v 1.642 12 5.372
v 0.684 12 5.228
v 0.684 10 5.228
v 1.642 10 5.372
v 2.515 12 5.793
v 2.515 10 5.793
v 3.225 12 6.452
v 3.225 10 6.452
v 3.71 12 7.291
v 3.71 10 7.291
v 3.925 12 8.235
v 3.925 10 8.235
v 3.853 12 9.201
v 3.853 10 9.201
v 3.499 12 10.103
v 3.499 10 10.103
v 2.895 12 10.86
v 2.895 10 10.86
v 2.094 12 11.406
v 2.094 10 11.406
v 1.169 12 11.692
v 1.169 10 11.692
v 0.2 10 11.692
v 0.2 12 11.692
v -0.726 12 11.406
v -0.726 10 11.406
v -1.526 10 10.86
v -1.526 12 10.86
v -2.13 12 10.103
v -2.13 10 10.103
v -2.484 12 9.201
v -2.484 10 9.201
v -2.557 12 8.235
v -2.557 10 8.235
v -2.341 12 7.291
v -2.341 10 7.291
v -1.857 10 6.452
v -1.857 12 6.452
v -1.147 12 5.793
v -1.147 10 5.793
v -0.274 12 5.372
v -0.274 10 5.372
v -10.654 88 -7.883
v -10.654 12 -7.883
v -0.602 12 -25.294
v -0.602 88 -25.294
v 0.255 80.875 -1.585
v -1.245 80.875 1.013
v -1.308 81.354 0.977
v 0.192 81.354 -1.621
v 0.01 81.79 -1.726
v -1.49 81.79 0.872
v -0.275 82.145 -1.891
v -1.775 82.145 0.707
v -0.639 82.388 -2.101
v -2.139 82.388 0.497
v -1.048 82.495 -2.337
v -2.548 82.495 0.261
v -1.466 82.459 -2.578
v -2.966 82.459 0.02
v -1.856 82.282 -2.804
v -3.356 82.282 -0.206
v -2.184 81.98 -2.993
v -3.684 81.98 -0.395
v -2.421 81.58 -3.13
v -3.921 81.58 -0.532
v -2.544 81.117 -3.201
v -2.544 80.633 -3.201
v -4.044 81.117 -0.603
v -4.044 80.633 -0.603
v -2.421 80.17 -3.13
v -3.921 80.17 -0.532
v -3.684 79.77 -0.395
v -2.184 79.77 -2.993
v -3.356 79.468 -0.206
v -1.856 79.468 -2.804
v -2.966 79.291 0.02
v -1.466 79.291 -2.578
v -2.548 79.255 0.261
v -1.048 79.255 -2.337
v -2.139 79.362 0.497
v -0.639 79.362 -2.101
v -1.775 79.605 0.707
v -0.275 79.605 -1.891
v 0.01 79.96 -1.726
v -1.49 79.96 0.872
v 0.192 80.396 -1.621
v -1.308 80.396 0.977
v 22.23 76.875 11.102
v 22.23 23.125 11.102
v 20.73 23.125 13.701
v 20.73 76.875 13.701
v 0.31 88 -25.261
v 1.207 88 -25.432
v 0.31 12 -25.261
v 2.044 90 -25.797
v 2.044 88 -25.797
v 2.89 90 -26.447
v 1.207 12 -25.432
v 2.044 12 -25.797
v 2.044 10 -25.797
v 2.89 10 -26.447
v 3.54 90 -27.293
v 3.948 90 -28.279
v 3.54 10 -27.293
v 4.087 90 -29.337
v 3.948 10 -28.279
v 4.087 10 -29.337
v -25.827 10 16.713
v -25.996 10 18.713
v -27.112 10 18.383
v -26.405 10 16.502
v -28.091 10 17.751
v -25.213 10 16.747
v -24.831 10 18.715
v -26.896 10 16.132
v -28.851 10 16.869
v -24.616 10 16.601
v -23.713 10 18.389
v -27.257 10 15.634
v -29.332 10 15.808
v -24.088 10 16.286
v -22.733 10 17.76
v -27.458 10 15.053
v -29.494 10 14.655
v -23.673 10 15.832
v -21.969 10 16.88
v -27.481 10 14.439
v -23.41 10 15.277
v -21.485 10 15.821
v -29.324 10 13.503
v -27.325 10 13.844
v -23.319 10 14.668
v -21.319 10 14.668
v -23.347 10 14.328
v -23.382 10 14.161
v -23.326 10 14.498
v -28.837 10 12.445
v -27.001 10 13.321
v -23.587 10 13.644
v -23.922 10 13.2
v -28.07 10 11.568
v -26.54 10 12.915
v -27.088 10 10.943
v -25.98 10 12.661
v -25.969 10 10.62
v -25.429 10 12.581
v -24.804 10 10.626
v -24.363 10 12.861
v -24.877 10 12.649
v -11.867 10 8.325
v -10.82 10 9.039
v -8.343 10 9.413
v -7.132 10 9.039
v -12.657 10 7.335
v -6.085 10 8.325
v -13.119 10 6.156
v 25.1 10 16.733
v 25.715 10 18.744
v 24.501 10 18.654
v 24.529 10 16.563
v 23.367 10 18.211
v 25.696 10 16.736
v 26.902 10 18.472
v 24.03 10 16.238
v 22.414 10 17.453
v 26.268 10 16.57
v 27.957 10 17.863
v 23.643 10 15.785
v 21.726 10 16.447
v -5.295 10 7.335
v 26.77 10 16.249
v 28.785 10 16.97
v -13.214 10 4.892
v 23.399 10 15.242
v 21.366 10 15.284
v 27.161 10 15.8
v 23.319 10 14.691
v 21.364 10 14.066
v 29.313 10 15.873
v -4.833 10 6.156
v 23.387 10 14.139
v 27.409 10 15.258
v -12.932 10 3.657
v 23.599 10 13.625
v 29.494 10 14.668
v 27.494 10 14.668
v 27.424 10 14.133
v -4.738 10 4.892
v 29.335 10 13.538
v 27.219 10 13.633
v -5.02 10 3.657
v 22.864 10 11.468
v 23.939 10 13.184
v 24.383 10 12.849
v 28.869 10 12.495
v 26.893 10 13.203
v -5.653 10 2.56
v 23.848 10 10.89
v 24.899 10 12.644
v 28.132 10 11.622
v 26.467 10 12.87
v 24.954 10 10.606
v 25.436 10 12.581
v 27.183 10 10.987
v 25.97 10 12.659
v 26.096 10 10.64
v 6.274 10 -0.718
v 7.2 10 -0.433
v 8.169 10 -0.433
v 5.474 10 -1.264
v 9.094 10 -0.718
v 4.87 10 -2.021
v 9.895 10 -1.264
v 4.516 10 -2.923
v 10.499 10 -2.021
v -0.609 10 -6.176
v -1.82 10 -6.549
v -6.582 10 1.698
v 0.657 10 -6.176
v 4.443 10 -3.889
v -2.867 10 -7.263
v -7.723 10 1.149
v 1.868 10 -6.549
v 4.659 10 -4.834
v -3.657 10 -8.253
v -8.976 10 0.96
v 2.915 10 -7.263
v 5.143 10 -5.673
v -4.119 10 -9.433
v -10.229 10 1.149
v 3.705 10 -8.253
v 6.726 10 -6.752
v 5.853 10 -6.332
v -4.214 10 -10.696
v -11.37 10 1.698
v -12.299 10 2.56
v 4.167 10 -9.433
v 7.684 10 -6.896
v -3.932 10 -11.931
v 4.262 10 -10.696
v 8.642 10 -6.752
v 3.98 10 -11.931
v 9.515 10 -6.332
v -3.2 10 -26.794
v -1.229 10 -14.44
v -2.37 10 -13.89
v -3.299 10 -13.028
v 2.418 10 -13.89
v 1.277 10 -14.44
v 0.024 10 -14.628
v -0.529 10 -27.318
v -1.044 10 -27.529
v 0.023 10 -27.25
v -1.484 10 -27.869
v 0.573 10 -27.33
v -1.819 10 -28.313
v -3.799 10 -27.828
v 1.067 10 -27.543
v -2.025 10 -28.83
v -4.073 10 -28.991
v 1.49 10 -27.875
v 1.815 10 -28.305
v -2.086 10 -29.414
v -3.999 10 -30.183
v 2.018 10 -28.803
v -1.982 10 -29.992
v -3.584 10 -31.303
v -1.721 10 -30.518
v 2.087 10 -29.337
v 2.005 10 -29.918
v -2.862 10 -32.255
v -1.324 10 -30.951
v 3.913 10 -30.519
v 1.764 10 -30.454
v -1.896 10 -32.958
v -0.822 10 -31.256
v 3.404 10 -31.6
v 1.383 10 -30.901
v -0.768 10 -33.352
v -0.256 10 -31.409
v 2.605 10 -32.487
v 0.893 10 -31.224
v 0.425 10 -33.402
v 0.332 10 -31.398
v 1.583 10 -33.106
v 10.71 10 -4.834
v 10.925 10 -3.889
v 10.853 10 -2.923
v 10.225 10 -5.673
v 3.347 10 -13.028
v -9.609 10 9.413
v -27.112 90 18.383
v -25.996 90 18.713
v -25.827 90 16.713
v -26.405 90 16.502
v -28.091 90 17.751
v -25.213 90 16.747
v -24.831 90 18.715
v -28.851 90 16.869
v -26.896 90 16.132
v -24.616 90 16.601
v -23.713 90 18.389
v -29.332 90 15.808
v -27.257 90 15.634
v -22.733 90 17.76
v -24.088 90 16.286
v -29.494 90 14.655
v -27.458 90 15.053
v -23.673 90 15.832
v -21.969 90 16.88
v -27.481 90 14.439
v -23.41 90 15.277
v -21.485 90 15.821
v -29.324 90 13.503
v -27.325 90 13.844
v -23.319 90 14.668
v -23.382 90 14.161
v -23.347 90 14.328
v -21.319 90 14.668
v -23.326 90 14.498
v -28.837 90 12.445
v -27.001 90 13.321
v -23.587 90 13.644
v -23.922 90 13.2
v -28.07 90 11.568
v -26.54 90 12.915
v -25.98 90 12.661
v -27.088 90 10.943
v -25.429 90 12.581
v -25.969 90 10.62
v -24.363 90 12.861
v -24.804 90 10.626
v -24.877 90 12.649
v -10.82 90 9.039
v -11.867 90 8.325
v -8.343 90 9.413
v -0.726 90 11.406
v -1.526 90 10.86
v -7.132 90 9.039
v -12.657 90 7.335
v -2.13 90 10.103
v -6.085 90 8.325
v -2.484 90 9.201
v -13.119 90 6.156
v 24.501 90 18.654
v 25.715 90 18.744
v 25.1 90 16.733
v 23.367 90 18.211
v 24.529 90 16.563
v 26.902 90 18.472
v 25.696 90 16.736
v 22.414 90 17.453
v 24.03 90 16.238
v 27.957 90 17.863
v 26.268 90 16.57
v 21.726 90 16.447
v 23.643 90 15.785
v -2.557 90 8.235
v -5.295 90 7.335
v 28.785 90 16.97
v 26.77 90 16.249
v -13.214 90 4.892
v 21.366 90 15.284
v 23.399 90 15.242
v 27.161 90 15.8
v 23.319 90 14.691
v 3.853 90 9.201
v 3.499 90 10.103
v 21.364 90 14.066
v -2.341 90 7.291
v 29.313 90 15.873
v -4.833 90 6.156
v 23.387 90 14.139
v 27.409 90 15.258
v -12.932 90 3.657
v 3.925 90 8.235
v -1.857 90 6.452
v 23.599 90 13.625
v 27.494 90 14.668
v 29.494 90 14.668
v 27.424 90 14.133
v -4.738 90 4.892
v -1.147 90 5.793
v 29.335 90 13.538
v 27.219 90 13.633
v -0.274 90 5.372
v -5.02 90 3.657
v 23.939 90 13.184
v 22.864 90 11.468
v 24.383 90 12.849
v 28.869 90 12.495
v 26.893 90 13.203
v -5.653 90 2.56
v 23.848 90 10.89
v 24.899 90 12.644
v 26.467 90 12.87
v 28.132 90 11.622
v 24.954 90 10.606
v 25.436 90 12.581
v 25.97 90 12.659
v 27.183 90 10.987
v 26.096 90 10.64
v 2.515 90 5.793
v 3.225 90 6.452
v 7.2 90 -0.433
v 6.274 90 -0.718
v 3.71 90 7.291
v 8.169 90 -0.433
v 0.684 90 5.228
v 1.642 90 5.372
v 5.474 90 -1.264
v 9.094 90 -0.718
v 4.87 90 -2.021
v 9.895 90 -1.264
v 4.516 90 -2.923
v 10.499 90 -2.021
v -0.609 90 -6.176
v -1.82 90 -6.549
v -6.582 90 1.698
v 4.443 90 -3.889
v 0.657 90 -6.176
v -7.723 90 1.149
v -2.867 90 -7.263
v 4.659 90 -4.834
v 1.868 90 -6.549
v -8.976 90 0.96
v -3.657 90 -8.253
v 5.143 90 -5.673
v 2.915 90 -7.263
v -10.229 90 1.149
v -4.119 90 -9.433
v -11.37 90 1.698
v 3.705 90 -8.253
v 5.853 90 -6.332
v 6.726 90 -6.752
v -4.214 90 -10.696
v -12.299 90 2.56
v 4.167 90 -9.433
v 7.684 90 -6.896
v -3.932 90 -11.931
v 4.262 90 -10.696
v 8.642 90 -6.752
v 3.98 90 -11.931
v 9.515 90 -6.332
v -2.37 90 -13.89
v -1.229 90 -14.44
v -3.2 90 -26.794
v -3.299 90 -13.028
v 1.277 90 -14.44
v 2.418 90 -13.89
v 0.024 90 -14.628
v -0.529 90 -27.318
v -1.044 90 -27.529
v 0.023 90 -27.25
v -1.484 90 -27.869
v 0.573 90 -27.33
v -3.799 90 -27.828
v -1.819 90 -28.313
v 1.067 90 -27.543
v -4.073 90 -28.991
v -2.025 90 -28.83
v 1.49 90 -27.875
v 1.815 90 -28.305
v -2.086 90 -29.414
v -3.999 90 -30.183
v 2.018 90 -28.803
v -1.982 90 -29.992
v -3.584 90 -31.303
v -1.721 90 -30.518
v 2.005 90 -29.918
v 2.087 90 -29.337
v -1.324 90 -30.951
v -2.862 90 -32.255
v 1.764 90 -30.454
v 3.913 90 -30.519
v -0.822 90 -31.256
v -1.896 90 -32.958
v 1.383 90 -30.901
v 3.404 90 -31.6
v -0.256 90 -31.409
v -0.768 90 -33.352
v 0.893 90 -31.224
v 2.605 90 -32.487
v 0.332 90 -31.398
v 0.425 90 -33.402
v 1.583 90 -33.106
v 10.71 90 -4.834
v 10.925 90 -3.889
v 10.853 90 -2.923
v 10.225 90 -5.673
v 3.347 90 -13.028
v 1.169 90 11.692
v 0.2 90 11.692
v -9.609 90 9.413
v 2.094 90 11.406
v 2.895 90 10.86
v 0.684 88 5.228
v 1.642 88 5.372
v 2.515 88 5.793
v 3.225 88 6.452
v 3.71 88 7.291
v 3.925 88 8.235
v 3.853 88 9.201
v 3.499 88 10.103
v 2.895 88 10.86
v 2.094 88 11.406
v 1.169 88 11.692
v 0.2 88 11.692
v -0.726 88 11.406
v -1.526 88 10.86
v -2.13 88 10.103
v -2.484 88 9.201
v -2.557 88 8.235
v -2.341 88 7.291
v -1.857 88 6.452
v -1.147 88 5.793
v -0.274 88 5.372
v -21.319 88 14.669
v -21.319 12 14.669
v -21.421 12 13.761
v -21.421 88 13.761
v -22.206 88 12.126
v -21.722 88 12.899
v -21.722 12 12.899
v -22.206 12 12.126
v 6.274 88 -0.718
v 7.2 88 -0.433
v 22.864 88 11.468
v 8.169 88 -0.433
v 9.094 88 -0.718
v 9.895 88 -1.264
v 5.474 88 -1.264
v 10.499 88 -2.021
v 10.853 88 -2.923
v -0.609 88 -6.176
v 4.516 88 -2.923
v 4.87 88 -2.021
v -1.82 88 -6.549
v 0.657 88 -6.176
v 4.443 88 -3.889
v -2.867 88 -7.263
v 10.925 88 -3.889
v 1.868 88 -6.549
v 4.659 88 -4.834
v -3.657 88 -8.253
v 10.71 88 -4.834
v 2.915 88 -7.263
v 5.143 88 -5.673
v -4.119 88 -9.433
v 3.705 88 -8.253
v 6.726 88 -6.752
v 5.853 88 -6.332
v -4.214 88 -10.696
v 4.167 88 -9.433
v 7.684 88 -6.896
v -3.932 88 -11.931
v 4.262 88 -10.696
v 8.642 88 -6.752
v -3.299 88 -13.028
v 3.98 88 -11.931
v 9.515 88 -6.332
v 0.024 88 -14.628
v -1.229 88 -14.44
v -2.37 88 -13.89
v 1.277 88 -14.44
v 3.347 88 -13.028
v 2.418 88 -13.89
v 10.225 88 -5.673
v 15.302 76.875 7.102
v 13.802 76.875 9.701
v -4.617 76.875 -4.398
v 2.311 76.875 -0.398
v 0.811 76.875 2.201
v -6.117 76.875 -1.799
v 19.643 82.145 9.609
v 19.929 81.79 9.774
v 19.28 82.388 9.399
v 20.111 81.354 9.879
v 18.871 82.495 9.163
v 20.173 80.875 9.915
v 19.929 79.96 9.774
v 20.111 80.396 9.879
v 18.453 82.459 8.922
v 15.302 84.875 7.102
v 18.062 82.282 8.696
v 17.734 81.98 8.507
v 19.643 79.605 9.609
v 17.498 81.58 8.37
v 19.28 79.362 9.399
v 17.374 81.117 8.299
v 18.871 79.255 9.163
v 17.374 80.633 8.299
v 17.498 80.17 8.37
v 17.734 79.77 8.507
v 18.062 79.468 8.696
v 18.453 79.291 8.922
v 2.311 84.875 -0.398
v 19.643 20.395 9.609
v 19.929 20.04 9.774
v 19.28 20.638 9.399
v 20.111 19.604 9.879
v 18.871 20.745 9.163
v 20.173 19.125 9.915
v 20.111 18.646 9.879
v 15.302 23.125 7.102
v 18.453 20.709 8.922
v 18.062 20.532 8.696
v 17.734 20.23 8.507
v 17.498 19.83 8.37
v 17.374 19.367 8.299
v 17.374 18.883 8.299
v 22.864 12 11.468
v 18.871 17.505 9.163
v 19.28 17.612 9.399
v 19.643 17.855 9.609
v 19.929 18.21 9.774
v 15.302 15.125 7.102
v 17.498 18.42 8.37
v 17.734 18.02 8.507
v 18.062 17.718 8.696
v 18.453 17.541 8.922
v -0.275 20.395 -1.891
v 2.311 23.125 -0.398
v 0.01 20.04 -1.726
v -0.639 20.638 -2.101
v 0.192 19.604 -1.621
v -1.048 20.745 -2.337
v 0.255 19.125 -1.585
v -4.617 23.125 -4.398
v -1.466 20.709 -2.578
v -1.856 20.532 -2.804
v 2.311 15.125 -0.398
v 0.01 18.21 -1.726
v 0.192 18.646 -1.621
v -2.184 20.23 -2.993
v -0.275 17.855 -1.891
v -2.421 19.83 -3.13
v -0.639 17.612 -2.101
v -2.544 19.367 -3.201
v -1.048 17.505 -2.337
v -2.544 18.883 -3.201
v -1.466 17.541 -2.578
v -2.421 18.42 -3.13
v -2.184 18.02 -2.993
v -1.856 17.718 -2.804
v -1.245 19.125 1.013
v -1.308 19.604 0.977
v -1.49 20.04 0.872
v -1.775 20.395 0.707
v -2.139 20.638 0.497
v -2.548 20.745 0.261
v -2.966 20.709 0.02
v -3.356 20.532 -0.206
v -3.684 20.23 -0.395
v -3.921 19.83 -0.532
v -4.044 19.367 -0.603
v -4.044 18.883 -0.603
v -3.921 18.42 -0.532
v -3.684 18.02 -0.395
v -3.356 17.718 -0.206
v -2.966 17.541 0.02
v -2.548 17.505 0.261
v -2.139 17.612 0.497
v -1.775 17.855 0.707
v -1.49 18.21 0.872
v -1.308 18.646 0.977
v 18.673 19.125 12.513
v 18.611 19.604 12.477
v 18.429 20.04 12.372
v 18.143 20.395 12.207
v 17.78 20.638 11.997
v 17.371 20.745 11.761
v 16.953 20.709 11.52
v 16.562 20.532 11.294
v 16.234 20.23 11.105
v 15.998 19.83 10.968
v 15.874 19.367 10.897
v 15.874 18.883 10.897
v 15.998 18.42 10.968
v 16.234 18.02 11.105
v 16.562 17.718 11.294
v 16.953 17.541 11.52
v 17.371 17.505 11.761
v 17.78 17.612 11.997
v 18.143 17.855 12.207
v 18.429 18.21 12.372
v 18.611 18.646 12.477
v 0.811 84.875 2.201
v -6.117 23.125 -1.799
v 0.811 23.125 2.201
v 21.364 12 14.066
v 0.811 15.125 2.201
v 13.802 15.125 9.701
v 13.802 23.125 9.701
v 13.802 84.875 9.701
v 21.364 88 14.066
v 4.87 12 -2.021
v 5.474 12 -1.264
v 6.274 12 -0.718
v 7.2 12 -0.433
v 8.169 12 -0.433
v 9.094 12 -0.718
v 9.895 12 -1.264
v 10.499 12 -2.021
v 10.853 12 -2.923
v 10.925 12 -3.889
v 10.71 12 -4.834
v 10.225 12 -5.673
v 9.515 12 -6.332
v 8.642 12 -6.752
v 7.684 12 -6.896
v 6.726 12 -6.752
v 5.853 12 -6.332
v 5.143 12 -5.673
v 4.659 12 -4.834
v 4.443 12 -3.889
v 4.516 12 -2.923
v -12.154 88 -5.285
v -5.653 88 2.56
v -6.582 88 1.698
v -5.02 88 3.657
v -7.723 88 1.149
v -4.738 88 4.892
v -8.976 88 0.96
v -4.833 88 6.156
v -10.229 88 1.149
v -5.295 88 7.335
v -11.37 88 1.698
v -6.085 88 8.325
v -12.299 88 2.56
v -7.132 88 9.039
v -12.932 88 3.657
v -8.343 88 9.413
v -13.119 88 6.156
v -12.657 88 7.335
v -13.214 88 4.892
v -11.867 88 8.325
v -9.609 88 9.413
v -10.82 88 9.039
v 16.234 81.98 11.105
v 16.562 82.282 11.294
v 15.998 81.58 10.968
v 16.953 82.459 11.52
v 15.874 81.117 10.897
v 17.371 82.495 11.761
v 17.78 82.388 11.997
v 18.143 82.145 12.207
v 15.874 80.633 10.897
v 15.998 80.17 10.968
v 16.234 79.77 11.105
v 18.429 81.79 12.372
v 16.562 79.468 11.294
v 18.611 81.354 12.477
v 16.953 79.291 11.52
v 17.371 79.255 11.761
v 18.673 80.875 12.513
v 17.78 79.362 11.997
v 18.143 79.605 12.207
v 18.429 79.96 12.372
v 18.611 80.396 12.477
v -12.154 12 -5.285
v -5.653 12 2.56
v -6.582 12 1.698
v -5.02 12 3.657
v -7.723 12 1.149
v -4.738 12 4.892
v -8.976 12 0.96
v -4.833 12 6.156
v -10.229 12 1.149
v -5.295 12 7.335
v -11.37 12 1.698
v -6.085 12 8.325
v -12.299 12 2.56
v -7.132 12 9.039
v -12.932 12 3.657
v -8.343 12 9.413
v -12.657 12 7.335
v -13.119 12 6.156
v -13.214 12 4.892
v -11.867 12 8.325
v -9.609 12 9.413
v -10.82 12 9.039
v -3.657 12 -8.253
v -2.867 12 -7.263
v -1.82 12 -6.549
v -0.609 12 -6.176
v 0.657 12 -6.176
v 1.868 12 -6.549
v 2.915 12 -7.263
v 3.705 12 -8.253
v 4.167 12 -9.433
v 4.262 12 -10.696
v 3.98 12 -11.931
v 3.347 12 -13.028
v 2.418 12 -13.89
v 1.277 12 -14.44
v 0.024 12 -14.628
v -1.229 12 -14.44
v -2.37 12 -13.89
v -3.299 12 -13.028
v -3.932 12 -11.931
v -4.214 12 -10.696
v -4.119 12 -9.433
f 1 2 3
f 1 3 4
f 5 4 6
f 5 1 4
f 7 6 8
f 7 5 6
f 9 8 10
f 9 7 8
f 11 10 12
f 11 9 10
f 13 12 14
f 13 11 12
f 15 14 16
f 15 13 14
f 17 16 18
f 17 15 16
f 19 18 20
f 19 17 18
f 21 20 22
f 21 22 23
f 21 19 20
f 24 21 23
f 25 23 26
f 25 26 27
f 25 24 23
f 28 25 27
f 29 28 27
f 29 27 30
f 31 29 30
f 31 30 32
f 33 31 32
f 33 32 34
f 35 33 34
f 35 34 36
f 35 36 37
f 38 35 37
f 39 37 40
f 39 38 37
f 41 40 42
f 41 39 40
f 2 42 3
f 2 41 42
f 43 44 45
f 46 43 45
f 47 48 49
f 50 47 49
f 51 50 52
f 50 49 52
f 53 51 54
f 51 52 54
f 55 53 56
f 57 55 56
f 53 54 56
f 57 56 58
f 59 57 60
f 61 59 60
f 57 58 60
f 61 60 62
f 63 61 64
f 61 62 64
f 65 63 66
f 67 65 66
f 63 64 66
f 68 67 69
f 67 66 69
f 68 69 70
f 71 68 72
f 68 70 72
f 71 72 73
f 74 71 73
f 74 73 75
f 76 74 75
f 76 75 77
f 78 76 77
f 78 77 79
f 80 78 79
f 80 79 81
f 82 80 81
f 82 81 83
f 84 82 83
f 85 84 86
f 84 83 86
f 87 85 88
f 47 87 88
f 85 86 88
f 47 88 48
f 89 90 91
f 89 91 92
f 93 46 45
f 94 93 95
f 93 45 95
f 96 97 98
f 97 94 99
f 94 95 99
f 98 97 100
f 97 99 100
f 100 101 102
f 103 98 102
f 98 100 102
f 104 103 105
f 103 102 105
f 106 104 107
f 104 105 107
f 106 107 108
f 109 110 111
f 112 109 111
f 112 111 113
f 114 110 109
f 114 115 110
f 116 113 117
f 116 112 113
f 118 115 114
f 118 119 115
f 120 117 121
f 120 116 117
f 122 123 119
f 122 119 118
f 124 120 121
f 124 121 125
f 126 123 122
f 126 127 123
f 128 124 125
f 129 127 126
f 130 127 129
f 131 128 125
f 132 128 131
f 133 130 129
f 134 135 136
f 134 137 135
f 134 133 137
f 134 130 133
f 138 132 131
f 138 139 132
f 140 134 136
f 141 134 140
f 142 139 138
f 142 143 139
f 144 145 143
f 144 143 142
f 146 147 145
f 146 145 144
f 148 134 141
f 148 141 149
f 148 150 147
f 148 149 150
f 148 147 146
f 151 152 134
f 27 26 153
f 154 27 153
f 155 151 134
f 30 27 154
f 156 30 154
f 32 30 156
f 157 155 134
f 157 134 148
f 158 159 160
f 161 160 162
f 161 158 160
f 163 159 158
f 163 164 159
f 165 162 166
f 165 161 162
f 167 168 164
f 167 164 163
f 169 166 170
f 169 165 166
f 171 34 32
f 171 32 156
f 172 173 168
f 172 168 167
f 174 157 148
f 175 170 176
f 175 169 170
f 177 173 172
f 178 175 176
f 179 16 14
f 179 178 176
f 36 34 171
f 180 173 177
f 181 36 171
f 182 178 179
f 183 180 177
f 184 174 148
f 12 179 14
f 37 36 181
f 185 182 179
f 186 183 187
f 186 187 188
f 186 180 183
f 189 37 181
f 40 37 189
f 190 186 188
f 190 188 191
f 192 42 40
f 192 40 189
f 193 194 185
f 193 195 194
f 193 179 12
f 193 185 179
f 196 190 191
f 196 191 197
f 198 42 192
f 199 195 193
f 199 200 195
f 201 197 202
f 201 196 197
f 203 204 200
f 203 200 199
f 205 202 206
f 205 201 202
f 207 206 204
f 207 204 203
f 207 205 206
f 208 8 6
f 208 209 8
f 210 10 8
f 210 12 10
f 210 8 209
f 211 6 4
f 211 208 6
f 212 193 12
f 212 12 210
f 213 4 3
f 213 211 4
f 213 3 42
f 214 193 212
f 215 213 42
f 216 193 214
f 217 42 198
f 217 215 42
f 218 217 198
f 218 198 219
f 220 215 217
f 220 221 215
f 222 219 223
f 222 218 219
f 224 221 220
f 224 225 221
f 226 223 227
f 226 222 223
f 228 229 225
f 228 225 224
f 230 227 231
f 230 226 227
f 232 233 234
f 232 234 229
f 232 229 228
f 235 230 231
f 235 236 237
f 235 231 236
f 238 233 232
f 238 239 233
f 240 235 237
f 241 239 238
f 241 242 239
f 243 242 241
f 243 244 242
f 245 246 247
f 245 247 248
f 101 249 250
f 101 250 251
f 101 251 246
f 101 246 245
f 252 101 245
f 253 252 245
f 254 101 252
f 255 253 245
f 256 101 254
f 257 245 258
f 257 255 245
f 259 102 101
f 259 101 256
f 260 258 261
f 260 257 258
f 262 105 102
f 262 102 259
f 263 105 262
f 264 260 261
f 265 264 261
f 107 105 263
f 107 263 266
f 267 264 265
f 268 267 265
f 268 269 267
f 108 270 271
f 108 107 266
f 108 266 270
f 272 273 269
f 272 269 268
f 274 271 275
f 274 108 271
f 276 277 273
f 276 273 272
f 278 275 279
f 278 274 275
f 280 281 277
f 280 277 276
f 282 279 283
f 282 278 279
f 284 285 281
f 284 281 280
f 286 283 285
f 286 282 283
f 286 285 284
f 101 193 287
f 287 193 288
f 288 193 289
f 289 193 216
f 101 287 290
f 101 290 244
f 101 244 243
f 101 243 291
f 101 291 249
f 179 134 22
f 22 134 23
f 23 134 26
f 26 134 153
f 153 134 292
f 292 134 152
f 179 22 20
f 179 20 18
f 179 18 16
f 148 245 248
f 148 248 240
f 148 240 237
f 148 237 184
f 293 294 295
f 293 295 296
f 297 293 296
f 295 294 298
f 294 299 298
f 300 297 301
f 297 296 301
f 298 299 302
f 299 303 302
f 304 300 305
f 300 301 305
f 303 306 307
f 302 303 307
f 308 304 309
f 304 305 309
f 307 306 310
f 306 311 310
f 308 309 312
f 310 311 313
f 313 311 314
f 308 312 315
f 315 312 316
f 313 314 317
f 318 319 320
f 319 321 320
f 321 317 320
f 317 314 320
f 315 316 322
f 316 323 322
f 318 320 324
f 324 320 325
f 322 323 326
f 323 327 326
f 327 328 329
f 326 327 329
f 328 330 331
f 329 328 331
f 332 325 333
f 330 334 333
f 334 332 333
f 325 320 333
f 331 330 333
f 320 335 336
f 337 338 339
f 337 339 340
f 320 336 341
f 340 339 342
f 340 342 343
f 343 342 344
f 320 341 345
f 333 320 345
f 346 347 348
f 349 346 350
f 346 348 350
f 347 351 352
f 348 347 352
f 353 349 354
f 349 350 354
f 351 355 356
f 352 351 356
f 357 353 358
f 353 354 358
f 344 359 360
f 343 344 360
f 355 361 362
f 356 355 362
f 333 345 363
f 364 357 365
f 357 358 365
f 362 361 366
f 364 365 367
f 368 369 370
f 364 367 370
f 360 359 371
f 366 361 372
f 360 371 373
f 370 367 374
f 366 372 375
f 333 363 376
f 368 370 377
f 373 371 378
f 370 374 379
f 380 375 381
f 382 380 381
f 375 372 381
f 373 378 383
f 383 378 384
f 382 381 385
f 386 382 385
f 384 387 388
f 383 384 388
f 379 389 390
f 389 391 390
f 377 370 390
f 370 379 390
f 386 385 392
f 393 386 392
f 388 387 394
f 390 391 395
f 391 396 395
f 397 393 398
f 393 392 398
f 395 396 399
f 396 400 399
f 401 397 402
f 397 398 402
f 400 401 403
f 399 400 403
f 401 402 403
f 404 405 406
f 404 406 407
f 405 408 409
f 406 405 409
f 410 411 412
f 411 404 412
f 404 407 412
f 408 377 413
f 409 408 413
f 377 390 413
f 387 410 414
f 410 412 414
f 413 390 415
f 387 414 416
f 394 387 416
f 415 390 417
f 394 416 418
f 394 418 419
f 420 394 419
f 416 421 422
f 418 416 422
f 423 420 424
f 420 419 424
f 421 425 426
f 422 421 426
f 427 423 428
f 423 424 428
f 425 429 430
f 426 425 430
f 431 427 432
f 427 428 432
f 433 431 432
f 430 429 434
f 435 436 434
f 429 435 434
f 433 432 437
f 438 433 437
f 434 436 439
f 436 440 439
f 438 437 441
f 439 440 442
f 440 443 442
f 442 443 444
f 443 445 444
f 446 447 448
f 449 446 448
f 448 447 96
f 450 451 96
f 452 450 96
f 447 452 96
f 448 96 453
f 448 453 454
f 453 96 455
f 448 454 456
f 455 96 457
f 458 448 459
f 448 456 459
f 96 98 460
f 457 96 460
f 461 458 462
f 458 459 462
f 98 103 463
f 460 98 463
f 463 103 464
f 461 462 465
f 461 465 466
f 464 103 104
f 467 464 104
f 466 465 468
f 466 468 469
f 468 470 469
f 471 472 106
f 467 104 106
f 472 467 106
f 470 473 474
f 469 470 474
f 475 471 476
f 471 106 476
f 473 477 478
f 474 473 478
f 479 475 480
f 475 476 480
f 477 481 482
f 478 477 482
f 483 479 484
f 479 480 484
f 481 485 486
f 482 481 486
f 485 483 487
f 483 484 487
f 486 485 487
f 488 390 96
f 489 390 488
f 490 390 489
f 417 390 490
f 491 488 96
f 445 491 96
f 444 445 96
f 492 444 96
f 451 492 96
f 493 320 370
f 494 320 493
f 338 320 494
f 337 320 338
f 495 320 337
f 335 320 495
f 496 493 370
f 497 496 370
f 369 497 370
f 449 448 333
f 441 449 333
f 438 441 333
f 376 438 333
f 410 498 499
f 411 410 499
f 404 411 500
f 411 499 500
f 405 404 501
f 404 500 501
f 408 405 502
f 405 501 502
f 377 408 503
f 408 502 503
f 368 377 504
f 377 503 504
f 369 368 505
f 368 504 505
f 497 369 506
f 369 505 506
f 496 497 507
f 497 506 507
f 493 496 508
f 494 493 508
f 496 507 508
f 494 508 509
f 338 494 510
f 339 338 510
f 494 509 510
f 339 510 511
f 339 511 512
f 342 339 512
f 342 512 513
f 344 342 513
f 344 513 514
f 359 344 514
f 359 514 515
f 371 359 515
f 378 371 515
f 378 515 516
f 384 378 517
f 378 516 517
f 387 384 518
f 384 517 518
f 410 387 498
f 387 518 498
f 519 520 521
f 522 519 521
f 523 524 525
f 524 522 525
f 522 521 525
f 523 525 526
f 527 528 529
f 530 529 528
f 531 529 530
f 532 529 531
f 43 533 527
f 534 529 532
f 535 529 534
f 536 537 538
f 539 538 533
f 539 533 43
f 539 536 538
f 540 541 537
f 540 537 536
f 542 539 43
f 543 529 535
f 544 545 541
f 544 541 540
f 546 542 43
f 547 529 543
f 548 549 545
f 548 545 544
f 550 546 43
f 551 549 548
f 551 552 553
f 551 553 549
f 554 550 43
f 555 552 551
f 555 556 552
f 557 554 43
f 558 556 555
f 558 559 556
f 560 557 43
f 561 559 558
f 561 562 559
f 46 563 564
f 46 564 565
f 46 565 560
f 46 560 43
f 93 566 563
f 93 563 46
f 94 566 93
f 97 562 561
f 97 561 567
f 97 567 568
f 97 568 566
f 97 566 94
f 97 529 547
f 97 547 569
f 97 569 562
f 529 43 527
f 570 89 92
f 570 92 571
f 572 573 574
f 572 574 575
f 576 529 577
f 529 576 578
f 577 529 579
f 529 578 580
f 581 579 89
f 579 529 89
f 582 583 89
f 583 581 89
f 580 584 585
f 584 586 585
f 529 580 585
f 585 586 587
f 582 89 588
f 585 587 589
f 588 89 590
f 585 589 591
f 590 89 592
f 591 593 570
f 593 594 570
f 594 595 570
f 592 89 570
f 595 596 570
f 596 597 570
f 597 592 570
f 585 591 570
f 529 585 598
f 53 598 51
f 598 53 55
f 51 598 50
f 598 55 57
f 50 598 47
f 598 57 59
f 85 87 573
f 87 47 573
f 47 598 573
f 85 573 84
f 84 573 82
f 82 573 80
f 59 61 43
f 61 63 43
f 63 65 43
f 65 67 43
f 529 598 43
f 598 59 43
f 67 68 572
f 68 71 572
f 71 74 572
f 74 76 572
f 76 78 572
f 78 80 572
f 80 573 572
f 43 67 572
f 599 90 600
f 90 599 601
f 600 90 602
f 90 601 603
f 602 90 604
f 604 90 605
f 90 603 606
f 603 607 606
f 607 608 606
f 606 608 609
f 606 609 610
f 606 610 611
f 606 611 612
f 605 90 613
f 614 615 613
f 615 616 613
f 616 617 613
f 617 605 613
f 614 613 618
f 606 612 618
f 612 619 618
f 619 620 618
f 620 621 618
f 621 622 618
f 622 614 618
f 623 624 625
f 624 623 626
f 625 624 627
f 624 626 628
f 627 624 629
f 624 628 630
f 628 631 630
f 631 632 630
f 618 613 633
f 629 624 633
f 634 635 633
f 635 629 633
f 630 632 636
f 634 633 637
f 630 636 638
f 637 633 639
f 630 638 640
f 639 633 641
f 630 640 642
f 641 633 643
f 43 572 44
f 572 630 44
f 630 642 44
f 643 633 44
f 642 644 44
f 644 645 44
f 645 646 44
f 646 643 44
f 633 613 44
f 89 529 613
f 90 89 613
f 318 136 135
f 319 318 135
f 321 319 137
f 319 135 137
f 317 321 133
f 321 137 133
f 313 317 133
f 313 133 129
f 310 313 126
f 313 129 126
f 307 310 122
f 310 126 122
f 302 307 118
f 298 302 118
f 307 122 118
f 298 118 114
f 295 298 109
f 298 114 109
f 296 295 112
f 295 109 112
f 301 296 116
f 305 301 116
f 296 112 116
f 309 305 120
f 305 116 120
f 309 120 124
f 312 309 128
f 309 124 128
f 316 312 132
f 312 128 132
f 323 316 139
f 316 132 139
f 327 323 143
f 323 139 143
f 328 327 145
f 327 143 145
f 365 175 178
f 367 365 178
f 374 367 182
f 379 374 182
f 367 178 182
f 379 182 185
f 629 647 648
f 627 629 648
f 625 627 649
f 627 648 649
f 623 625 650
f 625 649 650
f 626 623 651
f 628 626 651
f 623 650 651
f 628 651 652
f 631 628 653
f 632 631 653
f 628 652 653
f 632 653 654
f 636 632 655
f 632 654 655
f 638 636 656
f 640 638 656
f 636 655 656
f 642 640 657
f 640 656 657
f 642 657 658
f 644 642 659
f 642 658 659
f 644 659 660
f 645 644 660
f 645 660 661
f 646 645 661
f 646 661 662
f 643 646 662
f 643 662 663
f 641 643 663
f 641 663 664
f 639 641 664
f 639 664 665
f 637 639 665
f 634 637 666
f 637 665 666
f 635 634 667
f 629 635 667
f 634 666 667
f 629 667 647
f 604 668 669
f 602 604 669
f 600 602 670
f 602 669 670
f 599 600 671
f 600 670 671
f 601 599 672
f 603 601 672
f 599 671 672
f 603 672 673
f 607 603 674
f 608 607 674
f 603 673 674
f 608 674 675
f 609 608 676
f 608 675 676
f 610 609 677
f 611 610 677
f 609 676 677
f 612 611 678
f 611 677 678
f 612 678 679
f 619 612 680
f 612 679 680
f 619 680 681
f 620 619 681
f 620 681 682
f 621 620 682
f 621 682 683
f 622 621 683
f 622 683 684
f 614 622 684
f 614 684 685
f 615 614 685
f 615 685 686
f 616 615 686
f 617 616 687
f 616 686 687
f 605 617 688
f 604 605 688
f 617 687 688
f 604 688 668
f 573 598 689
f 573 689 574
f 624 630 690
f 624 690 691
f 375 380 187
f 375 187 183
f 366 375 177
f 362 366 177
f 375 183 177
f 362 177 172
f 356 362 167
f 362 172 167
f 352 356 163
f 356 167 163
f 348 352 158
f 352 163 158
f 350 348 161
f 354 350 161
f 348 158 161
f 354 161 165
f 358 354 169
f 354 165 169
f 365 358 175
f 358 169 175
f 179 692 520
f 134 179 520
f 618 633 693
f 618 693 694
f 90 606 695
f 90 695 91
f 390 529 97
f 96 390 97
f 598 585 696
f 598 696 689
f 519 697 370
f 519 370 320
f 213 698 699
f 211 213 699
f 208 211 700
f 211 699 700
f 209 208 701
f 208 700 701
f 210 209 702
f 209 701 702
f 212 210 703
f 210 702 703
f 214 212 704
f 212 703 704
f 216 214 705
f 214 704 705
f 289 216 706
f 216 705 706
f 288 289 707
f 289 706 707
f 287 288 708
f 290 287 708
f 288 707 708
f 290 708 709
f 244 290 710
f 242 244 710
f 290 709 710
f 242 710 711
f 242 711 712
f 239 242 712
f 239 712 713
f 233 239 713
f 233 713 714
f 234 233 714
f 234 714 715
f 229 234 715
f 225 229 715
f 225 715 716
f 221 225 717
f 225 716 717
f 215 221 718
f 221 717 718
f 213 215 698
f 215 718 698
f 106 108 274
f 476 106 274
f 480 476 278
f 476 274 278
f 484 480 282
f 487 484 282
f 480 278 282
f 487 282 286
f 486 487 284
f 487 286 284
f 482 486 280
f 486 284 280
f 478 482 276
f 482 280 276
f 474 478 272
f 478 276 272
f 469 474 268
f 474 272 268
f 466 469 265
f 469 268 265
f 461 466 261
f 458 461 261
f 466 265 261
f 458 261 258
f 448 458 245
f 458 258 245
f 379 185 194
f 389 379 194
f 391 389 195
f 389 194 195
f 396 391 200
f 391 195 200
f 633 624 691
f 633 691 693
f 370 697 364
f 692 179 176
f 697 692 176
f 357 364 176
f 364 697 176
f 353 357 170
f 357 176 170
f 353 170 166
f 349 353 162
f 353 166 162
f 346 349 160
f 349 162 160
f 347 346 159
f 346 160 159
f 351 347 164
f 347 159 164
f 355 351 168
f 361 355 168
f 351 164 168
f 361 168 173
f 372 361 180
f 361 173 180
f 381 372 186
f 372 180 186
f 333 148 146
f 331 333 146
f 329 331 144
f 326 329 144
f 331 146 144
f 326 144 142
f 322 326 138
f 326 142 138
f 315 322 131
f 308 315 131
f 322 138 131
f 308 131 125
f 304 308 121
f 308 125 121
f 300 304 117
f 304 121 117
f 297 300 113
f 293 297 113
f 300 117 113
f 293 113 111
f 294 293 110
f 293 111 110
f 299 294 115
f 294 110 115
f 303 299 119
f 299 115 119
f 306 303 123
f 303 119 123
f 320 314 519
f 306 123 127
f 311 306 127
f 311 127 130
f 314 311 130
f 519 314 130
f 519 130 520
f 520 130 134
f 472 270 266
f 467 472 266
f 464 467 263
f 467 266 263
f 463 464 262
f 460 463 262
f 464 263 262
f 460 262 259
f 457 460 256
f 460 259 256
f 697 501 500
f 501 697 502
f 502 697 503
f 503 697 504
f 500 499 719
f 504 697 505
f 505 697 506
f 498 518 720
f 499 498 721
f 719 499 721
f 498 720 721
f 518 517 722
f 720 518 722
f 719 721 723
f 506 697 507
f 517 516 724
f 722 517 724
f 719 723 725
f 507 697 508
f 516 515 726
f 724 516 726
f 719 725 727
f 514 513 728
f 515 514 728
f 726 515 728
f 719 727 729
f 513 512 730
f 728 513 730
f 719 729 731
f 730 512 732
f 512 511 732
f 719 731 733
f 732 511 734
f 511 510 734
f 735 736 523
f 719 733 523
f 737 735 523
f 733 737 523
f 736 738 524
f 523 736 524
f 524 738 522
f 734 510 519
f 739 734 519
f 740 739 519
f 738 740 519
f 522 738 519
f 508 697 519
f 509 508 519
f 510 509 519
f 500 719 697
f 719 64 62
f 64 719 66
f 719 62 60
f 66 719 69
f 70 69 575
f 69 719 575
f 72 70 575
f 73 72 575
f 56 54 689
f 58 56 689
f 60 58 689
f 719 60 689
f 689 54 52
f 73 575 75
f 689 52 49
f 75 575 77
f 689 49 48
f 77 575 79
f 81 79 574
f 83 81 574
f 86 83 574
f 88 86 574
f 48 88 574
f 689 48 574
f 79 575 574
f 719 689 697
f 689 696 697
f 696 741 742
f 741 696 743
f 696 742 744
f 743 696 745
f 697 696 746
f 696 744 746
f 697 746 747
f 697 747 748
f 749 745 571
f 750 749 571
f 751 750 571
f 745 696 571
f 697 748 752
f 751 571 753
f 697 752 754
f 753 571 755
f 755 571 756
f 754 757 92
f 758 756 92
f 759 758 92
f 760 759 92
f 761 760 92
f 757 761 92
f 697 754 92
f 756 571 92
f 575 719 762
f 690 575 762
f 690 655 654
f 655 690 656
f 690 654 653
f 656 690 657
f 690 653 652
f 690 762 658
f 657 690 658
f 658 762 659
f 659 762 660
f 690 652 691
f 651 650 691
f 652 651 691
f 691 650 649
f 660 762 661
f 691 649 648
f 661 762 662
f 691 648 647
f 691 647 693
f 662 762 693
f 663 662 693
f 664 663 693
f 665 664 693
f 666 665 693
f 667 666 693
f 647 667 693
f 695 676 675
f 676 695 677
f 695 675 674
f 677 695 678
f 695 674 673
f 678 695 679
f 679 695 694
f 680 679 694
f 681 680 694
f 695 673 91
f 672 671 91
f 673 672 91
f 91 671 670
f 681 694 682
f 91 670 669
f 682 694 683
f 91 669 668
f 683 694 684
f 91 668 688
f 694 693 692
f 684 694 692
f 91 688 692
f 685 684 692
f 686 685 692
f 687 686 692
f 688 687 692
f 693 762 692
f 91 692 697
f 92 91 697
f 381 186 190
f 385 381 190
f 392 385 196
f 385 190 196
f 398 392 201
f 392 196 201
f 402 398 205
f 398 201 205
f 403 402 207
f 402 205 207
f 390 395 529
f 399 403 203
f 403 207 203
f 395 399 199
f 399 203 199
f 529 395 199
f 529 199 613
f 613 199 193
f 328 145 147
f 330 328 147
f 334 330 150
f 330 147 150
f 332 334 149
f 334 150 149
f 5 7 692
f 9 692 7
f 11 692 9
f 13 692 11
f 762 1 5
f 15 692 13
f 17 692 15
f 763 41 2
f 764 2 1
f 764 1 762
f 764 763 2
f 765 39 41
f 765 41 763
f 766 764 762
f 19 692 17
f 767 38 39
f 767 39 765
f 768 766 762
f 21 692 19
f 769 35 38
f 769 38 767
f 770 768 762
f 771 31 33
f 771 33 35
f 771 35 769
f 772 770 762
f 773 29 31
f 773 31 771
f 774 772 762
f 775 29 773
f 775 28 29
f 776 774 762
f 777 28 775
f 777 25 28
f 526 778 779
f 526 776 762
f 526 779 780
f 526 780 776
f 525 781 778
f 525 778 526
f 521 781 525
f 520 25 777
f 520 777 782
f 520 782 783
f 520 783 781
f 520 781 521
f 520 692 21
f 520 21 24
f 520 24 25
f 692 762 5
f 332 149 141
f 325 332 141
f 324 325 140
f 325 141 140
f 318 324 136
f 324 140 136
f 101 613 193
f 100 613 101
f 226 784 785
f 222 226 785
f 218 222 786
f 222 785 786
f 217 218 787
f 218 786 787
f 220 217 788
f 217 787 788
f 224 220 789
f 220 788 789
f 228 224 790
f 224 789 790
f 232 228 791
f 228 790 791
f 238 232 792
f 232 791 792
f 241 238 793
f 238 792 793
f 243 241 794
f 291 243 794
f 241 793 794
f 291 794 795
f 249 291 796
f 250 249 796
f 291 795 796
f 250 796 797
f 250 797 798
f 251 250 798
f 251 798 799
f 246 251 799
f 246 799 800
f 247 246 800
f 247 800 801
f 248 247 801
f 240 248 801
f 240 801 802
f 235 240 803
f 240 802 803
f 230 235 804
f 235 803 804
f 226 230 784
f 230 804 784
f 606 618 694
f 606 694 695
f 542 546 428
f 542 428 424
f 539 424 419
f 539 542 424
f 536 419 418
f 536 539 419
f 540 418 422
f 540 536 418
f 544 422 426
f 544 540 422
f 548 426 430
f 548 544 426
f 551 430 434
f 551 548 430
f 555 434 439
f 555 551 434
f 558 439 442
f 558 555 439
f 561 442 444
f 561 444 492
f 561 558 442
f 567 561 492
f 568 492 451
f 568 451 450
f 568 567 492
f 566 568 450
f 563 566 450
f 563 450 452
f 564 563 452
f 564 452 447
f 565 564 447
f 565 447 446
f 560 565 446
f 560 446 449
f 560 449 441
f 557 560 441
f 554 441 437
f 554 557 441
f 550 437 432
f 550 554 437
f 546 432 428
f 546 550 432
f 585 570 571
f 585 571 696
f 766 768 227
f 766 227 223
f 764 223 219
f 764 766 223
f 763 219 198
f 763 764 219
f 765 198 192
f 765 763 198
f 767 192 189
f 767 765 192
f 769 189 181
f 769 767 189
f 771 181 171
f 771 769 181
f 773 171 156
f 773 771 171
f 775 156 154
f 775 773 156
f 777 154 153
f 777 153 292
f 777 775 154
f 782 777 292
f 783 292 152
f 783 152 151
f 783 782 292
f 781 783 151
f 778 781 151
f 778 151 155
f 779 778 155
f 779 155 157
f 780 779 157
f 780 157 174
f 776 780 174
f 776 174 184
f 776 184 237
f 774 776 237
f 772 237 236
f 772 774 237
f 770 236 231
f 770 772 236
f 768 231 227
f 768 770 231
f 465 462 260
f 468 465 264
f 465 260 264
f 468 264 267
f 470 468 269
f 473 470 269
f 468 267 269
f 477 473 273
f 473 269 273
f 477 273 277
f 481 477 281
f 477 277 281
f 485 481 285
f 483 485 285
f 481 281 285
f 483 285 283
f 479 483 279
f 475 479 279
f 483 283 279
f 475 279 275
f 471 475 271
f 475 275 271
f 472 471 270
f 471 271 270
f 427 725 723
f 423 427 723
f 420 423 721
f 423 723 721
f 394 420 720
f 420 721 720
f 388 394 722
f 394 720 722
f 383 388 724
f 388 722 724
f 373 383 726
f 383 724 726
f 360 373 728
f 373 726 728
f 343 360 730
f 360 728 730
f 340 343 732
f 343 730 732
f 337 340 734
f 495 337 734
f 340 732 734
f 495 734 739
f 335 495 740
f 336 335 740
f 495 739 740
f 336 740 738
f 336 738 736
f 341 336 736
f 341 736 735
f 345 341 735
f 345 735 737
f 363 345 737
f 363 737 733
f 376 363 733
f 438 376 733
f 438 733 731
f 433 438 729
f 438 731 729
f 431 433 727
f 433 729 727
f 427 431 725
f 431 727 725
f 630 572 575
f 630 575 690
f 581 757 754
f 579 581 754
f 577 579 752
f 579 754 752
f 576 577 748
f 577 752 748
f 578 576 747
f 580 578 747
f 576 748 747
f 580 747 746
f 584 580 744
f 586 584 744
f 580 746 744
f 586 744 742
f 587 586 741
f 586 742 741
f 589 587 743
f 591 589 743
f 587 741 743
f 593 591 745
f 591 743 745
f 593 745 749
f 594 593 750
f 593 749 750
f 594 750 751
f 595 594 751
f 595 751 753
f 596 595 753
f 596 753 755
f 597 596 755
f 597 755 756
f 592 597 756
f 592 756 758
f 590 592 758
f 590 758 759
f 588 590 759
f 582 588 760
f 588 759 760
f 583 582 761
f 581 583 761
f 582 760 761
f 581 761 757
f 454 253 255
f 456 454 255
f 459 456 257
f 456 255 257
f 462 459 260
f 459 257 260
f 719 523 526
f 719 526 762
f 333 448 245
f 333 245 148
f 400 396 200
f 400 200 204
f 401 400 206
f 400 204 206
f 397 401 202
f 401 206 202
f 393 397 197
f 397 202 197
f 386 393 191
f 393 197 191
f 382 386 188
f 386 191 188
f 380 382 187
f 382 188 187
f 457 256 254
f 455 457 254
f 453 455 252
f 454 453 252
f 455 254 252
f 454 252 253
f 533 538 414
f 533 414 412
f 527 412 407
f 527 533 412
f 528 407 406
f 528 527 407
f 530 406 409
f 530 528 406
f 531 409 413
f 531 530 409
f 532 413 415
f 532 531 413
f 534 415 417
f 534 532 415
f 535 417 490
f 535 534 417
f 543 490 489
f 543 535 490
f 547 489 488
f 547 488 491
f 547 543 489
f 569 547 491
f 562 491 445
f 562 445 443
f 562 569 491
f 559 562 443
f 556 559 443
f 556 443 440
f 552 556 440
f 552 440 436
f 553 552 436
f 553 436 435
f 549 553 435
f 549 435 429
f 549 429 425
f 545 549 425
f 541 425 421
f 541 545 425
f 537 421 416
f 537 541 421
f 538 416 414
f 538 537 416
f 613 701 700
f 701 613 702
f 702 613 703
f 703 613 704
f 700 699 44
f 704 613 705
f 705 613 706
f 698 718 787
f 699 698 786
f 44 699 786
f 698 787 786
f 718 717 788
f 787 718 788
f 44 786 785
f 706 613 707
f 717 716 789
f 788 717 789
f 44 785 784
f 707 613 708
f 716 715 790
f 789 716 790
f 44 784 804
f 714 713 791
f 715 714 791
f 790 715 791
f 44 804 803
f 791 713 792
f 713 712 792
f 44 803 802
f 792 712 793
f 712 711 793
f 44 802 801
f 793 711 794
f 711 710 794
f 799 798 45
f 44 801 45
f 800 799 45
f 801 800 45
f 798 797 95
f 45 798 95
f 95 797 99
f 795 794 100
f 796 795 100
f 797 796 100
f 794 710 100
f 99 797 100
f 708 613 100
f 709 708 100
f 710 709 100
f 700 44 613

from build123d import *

# Parameters (mm, degrees)
SKETCH1_R                 = 38.1
SKETCH1_R_2               = 1.5875
BOSS_EXTRUDE1_DEPTH       = 10
BOSS_EXTRUDE2_DEPTH       = 80
RIB1_REACH                = 93.581
SKETCH3_WALL_W            = 227.849219062
SKETCH3_WALL_H            = 2
SKETCH5_R                 = 3.25
SKETCH5_R_2               = 4.25
CUT_EXTRUDE1_DEPTH        = 2
MIRROR2_COPY_1_REACH      = 93.581
MIRROR2_COPY_1_SKETCH_W   = 227.849219062
MIRROR2_COPY_1_SKETCH_H   = 2
MIRROR2_COPY_2_SKETCH_R   = 3.25
MIRROR2_COPY_2_SKETCH_R_2 = 4.25
MIRROR2_COPY_2_DEPTH      = 2
SKETCH12_R                = 1.625
CUT_EXTRUDE3_DEPTH        = 3
CUT_EXTRUDE4_DEPTH        = 3


with BuildPart() as part:
    # Sketch1 → Boss-Extrude1 (new body)
    with BuildSketch(Plane(origin=(0, 0, 0), x_dir=(1, 0, 0), z_dir=(0, 1, 0))):
        with Locations(Location((0, 0, 0), (0, 0, 270))):
            Circle(SKETCH1_R)
        with Locations(Location((0, 29.337, 0), (0, 0, 270))):
            Circle(SKETCH1_R_2, mode=Mode.SUBTRACT)
        with Locations(Location((25.406587271, -14.6685, 0), (0, 0, 270))):
            Circle(SKETCH1_R_2, mode=Mode.SUBTRACT)
        with Locations(Location((-25.406587271, -14.6685, 0), (0, 0, 270))):
            Circle(SKETCH1_R_2, mode=Mode.SUBTRACT)
    extrude(amount=BOSS_EXTRUDE1_DEPTH)


with BuildPart() as body_2:
    # Sketch2 → Boss-Extrude2 (new body)
    with BuildSketch(Plane(origin=(0, 10, 0), x_dir=(1, 0, 0), z_dir=(0, 1, 0))):
        with BuildLine():
            Line((-23.362837271, -11.128621162), (-13.453293635, 6.035211894))
            Line((-13.453293635, 6.035211894), (-12.703293635, 7.33425))
            Line((-12.703293635, 7.33425), (-11.953293635, 8.633288106))
            Line((-11.953293635, 8.633288106), (-2.04375, 25.797121162))
            ThreePointArc((-2.04375, 25.797121162), (-2.668939671, 26.241128995), (-3.200199346, 26.794092138))
            Line((-3.200199346, 26.794092138), (-24.804464136, -10.625592138))
            ThreePointArc((-24.804464136, -10.625592138), (-24.059954169, -10.809194941), (-23.362837271, -11.128621162))
        make_face()
        with BuildLine():
            Line((-12.15425553, 5.285211894), (-13.453293635, 6.035211894))
            Line((-13.453293635, 6.035211894), (-23.362837271, -11.128621162))
            ThreePointArc((-23.362837271, -11.128621162), (-22.7376476, -11.572628995), (-22.206387925, -12.125592138))
            Line((-22.206387925, -12.125592138), (-12.15425553, 5.285211894))
        make_face()
        with BuildLine():
            ThreePointArc((-21.319087271, -14.6685), (-21.547282212, -13.321866898), (-22.206387925, -12.125592138))
            Line((-22.206387925, -12.125592138), (-23.381660701, -14.161224299))
            ThreePointArc((-23.381660701, -14.161224299), (-23.334789686, -14.412939796), (-23.319087271, -14.6685))
            ThreePointArc((-23.319087271, -14.6685), (-26.663807692, -16.334949238), (-25.979736912, -12.661224299))
            Line((-25.979736912, -12.661224299), (-24.804464136, -10.625592138))
            ThreePointArc((-24.804464136, -10.625592138), (-28.502458276, -17.337439671), (-21.319087271, -14.6685))
        make_face()
        with BuildLine():
            Line((-24.362837271, -12.86067197), (-23.362837271, -11.128621162))
            ThreePointArc((-23.362837271, -11.128621162), (-24.059954169, -10.809194941), (-24.804464136, -10.625592138))
            Line((-24.804464136, -10.625592138), (-25.979736912, -12.661224299))
            ThreePointArc((-25.979736912, -12.661224299), (-25.151027067, -12.596702415), (-24.362837271, -12.86067197))
        make_face()
        with BuildLine():
            ThreePointArc((-22.206387925, -12.125592138), (-22.7376476, -11.572628995), (-23.362837271, -11.128621162))
            Line((-23.362837271, -11.128621162), (-24.362837271, -12.86067197))
            ThreePointArc((-24.362837271, -12.86067197), (-23.740138033, -13.411279579), (-23.381660701, -14.161224299))
            Line((-23.381660701, -14.161224299), (-22.206387925, -12.125592138))
        make_face()
        with BuildLine():
            ThreePointArc((4.0875, 29.337), (-1.346633102, 33.196305059), (-3.200199346, 26.794092138))
            Line((-3.200199346, 26.794092138), (-2.02492657, 28.829724299))
            ThreePointArc((-2.02492657, 28.829724299), (-0.255560204, 31.408797585), (2.0875, 29.337))
            ThreePointArc((2.0875, 29.337), (1.666449238, 28.079779579), (0.573149641, 27.329724299))
            Line((0.573149641, 27.329724299), (-0.602123135, 25.294092138))
            ThreePointArc((-0.602123135, 25.294092138), (2.668939671, 26.241128995), (4.0875, 29.337))
        make_face()
        with BuildLine():
            ThreePointArc((-3.200199346, 26.794092138), (-2.668939671, 26.241128995), (-2.04375, 25.797121162))
            Line((-2.04375, 25.797121162), (-1.04375, 27.52917197))
            ThreePointArc((-1.04375, 27.52917197), (-1.666449238, 28.079779579), (-2.02492657, 28.829724299))
            Line((-2.02492657, 28.829724299), (-3.200199346, 26.794092138))
        make_face()
        with BuildLine():
            Line((-1.04375, 27.52917197), (-2.04375, 25.797121162))
            ThreePointArc((-2.04375, 25.797121162), (-1.346633102, 25.477694941), (-0.602123135, 25.294092138))
            Line((-0.602123135, 25.294092138), (0.573149641, 27.329724299))
            ThreePointArc((0.573149641, 27.329724299), (-0.255560204, 27.265202415), (-1.04375, 27.52917197))
        make_face()
        with BuildLine():
            Line((-2.04375, 25.797121162), (-11.953293635, 8.633288106))
            Line((-11.953293635, 8.633288106), (-10.65425553, 7.883288106))
            Line((-10.65425553, 7.883288106), (-0.602123135, 25.294092138))
            ThreePointArc((-0.602123135, 25.294092138), (-1.346633102, 25.477694941), (-2.04375, 25.797121162))
        make_face()
        Polygon((-12.703293635, 7.33425), (-13.453293635, 6.035211894), (-12.15425553, 5.285211894), (-11.40425553, 6.58425), align=None)
        Polygon((-11.953293635, 8.633288106), (-12.703293635, 7.33425), (-11.40425553, 6.58425), (-10.65425553, 7.883288106), align=None)
        with BuildLine():
            Line((-10.65425553, 7.883288106), (-11.40425553, 6.58425))
            Line((-11.40425553, 6.58425), (21.866708433, -12.62475))
            ThreePointArc((21.866708433, -12.62475), (22.310716265, -11.999560329), (22.863679409, -11.468300654))
            Line((22.863679409, -11.468300654), (-10.65425553, 7.883288106))
        make_face()
        with BuildLine():
            Line((-11.40425553, 6.58425), (-12.15425553, 5.285211894))
            Line((-12.15425553, 5.285211894), (21.363679409, -14.066376865))
            ThreePointArc((21.363679409, -14.066376865), (21.547282212, -13.321866898), (21.866708433, -12.62475))
            Line((21.866708433, -12.62475), (-11.40425553, 6.58425))
        make_face()
        with BuildLine():
            ThreePointArc((22.863679409, -11.468300654), (22.310716265, -11.999560329), (21.866708433, -12.62475))
            Line((21.866708433, -12.62475), (23.59875924, -13.62475))
            ThreePointArc((23.59875924, -13.62475), (24.14936685, -13.002050762), (24.89931157, -12.64357343))
            Line((24.89931157, -12.64357343), (22.863679409, -11.468300654))
        make_face()
        with BuildLine():
            ThreePointArc((21.866708433, -12.62475), (21.547282212, -13.321866898), (21.363679409, -14.066376865))
            Line((21.363679409, -14.066376865), (23.39931157, -15.241649641))
            ThreePointArc((23.39931157, -15.241649641), (23.334789686, -14.412939796), (23.59875924, -13.62475))
            Line((23.59875924, -13.62475), (21.866708433, -12.62475))
        make_face()
        with BuildLine():
            Line((23.39931157, -15.241649641), (21.363679409, -14.066376865))
            ThreePointArc((21.363679409, -14.066376865), (25.104701229, -18.744836722), (29.494087271, -14.6685))
            ThreePointArc((29.494087271, -14.6685), (27.183314651, -10.987345824), (22.863679409, -11.468300654))
            Line((22.863679409, -11.468300654), (24.89931157, -12.64357343))
            ThreePointArc((24.89931157, -12.64357343), (26.690861039, -13.022809526), (27.494087271, -14.6685))
            ThreePointArc((27.494087271, -14.6685), (25.695955743, -16.735846642), (23.39931157, -15.241649641))
        make_face()
    extrude(amount=BOSS_EXTRUDE2_DEPTH)

    # Sketch3 wall → Rib1 (add, up to next)
    with BuildSketch(Plane(origin=(0.022296069, 90, 14.367438433), x_dir=(-0.999900512002, 0, 0.014105534336), z_dir=(0.014105534336, 0, 0.999900512002)), mode=Mode.PRIVATE) as rib1_sk1:
        with Locations((0, 1)):
            Rectangle(SKETCH3_WALL_W, SKETCH3_WALL_H)
    rib1_tool1 = extrude(rib1_sk1.sketch, amount=-RIB1_REACH, mode=Mode.PRIVATE) - body_2.part
    rib1 = rib1_tool1.solids().sort_by_distance((0.022296069, 90, 14.367438433))[0]
    add(rib1)

    # Sketch5 → Cut-Extrude1 (cut)
    with BuildSketch(Plane.XZ.offset(-88)):
        with Locations(Location((0.684201738, 8.477927826, 0), (0, 0, 270))):
            Circle(SKETCH5_R)
        with Locations(Location((-8.976052299, 5.209978634, 0), (0, 0, 270))):
            Circle(SKETCH5_R_2)
    cut_extrude1 = extrude(amount=-CUT_EXTRUDE1_DEPTH, mode=Mode.SUBTRACT)

    # Mirror1: Rib1, Cut-Extrude1 across plane
    add(rib1.mirror(Plane.ZX.offset(50)))
    add(cut_extrude1.mirror(Plane.ZX.offset(50)), mode=Mode.SUBTRACT)

    # Mirror2: Rib1, Cut-Extrude1 across plane
    add(rib1.mirror(Plane(origin=(0, 0, 0), x_dir=(0.8660254037844597, 0, 0.49999999999996353), z_dir=(0.49999999999996314, 0, -0.8660254037844598))))
    add(cut_extrude1.mirror(Plane(origin=(0, 0, 0), x_dir=(0.8660254037844597, 0, 0.49999999999996353), z_dir=(0.49999999999996314, 0, -0.8660254037844598))), mode=Mode.SUBTRACT)

    # Mirror2 copy 1 sketch → Mirror2 copy 1 (add, up to next)
    with BuildSketch(Plane(origin=(12.453714705, 10, -7.164410254), x_dir=(-0.48773450493214454, 0, -0.8729920118187576), z_dir=(0.8729920118187576, 0, -0.48773450493214465)), mode=Mode.PRIVATE) as mirror2_copy_1_sk1:
        with Locations((0, 1)):
            Rectangle(MIRROR2_COPY_1_SKETCH_W, MIRROR2_COPY_1_SKETCH_H)
    mirror2_copy_1_tool1 = extrude(mirror2_copy_1_sk1.sketch, amount=-MIRROR2_COPY_1_REACH, mode=Mode.PRIVATE) - body_2.part
    add(mirror2_copy_1_tool1.solids().sort_by_distance((12.453714705, 10, -7.164410254))[0])

    # Mirror2 copy 2 sketch → Mirror2 copy 2 (cut)
    with BuildSketch(Plane(origin=(0, 12, 0), x_dir=(0.5000000000000736, 0, 0.8660254037843962), z_dir=(0, 1, 0))):
        with Locations(Location((0.684201738, 8.477927826, 0), (0, 0, 270))):
            Circle(MIRROR2_COPY_2_SKETCH_R)
        with Locations(Location((-8.976052299, 5.209978634, 0), (0, 0, 270))):
            Circle(MIRROR2_COPY_2_SKETCH_R_2)
    extrude(amount=-MIRROR2_COPY_2_DEPTH, mode=Mode.SUBTRACT)

    # Sketch12 → Cut-Extrude3 (cut)
    with BuildSketch(Plane(origin=(-0.75, 0, 1.299038106), x_dir=(0.8660254037844608, 0, 0.49999999999996164), z_dir=(-0.49999999999996175, 0, 0.8660254037844609))):
        with Locations((-2.197056325, 80.875)):
            Circle(SKETCH12_R)
        with Locations((-2.197056325, 19.125)):
            Circle(SKETCH12_R)
        with Locations((20.802943675, 19.125)):
            Circle(SKETCH12_R)
        with Locations((20.802943675, 80.875)):
            Circle(SKETCH12_R)
    extrude(amount=-CUT_EXTRUDE3_DEPTH, mode=Mode.SUBTRACT)

    # Sketch13 → Cut-Extrude4 (cut)
    with BuildSketch(Plane(origin=(0.75, 0, -1.299038106), x_dir=(-0.8660254037844608, 0, -0.49999999999996164), z_dir=(0.49999999999996175, 0, -0.8660254037844609))):
        Polygon((6.197056325, 76.875), (6.197056325, 23.125), (-1.802943675, 23.125), (-1.802943675, 15.125), (-16.802943675, 15.125), (-16.802943675, 23.125), (-24.802943675, 23.125), (-24.802943675, 76.875), (-16.802943675, 76.875), (-16.802943675, 84.875), (-1.802943675, 84.875), (-1.802943675, 76.875), align=None)
    extrude(amount=-CUT_EXTRUDE4_DEPTH, mode=Mode.SUBTRACT)


solid = body_2.part
